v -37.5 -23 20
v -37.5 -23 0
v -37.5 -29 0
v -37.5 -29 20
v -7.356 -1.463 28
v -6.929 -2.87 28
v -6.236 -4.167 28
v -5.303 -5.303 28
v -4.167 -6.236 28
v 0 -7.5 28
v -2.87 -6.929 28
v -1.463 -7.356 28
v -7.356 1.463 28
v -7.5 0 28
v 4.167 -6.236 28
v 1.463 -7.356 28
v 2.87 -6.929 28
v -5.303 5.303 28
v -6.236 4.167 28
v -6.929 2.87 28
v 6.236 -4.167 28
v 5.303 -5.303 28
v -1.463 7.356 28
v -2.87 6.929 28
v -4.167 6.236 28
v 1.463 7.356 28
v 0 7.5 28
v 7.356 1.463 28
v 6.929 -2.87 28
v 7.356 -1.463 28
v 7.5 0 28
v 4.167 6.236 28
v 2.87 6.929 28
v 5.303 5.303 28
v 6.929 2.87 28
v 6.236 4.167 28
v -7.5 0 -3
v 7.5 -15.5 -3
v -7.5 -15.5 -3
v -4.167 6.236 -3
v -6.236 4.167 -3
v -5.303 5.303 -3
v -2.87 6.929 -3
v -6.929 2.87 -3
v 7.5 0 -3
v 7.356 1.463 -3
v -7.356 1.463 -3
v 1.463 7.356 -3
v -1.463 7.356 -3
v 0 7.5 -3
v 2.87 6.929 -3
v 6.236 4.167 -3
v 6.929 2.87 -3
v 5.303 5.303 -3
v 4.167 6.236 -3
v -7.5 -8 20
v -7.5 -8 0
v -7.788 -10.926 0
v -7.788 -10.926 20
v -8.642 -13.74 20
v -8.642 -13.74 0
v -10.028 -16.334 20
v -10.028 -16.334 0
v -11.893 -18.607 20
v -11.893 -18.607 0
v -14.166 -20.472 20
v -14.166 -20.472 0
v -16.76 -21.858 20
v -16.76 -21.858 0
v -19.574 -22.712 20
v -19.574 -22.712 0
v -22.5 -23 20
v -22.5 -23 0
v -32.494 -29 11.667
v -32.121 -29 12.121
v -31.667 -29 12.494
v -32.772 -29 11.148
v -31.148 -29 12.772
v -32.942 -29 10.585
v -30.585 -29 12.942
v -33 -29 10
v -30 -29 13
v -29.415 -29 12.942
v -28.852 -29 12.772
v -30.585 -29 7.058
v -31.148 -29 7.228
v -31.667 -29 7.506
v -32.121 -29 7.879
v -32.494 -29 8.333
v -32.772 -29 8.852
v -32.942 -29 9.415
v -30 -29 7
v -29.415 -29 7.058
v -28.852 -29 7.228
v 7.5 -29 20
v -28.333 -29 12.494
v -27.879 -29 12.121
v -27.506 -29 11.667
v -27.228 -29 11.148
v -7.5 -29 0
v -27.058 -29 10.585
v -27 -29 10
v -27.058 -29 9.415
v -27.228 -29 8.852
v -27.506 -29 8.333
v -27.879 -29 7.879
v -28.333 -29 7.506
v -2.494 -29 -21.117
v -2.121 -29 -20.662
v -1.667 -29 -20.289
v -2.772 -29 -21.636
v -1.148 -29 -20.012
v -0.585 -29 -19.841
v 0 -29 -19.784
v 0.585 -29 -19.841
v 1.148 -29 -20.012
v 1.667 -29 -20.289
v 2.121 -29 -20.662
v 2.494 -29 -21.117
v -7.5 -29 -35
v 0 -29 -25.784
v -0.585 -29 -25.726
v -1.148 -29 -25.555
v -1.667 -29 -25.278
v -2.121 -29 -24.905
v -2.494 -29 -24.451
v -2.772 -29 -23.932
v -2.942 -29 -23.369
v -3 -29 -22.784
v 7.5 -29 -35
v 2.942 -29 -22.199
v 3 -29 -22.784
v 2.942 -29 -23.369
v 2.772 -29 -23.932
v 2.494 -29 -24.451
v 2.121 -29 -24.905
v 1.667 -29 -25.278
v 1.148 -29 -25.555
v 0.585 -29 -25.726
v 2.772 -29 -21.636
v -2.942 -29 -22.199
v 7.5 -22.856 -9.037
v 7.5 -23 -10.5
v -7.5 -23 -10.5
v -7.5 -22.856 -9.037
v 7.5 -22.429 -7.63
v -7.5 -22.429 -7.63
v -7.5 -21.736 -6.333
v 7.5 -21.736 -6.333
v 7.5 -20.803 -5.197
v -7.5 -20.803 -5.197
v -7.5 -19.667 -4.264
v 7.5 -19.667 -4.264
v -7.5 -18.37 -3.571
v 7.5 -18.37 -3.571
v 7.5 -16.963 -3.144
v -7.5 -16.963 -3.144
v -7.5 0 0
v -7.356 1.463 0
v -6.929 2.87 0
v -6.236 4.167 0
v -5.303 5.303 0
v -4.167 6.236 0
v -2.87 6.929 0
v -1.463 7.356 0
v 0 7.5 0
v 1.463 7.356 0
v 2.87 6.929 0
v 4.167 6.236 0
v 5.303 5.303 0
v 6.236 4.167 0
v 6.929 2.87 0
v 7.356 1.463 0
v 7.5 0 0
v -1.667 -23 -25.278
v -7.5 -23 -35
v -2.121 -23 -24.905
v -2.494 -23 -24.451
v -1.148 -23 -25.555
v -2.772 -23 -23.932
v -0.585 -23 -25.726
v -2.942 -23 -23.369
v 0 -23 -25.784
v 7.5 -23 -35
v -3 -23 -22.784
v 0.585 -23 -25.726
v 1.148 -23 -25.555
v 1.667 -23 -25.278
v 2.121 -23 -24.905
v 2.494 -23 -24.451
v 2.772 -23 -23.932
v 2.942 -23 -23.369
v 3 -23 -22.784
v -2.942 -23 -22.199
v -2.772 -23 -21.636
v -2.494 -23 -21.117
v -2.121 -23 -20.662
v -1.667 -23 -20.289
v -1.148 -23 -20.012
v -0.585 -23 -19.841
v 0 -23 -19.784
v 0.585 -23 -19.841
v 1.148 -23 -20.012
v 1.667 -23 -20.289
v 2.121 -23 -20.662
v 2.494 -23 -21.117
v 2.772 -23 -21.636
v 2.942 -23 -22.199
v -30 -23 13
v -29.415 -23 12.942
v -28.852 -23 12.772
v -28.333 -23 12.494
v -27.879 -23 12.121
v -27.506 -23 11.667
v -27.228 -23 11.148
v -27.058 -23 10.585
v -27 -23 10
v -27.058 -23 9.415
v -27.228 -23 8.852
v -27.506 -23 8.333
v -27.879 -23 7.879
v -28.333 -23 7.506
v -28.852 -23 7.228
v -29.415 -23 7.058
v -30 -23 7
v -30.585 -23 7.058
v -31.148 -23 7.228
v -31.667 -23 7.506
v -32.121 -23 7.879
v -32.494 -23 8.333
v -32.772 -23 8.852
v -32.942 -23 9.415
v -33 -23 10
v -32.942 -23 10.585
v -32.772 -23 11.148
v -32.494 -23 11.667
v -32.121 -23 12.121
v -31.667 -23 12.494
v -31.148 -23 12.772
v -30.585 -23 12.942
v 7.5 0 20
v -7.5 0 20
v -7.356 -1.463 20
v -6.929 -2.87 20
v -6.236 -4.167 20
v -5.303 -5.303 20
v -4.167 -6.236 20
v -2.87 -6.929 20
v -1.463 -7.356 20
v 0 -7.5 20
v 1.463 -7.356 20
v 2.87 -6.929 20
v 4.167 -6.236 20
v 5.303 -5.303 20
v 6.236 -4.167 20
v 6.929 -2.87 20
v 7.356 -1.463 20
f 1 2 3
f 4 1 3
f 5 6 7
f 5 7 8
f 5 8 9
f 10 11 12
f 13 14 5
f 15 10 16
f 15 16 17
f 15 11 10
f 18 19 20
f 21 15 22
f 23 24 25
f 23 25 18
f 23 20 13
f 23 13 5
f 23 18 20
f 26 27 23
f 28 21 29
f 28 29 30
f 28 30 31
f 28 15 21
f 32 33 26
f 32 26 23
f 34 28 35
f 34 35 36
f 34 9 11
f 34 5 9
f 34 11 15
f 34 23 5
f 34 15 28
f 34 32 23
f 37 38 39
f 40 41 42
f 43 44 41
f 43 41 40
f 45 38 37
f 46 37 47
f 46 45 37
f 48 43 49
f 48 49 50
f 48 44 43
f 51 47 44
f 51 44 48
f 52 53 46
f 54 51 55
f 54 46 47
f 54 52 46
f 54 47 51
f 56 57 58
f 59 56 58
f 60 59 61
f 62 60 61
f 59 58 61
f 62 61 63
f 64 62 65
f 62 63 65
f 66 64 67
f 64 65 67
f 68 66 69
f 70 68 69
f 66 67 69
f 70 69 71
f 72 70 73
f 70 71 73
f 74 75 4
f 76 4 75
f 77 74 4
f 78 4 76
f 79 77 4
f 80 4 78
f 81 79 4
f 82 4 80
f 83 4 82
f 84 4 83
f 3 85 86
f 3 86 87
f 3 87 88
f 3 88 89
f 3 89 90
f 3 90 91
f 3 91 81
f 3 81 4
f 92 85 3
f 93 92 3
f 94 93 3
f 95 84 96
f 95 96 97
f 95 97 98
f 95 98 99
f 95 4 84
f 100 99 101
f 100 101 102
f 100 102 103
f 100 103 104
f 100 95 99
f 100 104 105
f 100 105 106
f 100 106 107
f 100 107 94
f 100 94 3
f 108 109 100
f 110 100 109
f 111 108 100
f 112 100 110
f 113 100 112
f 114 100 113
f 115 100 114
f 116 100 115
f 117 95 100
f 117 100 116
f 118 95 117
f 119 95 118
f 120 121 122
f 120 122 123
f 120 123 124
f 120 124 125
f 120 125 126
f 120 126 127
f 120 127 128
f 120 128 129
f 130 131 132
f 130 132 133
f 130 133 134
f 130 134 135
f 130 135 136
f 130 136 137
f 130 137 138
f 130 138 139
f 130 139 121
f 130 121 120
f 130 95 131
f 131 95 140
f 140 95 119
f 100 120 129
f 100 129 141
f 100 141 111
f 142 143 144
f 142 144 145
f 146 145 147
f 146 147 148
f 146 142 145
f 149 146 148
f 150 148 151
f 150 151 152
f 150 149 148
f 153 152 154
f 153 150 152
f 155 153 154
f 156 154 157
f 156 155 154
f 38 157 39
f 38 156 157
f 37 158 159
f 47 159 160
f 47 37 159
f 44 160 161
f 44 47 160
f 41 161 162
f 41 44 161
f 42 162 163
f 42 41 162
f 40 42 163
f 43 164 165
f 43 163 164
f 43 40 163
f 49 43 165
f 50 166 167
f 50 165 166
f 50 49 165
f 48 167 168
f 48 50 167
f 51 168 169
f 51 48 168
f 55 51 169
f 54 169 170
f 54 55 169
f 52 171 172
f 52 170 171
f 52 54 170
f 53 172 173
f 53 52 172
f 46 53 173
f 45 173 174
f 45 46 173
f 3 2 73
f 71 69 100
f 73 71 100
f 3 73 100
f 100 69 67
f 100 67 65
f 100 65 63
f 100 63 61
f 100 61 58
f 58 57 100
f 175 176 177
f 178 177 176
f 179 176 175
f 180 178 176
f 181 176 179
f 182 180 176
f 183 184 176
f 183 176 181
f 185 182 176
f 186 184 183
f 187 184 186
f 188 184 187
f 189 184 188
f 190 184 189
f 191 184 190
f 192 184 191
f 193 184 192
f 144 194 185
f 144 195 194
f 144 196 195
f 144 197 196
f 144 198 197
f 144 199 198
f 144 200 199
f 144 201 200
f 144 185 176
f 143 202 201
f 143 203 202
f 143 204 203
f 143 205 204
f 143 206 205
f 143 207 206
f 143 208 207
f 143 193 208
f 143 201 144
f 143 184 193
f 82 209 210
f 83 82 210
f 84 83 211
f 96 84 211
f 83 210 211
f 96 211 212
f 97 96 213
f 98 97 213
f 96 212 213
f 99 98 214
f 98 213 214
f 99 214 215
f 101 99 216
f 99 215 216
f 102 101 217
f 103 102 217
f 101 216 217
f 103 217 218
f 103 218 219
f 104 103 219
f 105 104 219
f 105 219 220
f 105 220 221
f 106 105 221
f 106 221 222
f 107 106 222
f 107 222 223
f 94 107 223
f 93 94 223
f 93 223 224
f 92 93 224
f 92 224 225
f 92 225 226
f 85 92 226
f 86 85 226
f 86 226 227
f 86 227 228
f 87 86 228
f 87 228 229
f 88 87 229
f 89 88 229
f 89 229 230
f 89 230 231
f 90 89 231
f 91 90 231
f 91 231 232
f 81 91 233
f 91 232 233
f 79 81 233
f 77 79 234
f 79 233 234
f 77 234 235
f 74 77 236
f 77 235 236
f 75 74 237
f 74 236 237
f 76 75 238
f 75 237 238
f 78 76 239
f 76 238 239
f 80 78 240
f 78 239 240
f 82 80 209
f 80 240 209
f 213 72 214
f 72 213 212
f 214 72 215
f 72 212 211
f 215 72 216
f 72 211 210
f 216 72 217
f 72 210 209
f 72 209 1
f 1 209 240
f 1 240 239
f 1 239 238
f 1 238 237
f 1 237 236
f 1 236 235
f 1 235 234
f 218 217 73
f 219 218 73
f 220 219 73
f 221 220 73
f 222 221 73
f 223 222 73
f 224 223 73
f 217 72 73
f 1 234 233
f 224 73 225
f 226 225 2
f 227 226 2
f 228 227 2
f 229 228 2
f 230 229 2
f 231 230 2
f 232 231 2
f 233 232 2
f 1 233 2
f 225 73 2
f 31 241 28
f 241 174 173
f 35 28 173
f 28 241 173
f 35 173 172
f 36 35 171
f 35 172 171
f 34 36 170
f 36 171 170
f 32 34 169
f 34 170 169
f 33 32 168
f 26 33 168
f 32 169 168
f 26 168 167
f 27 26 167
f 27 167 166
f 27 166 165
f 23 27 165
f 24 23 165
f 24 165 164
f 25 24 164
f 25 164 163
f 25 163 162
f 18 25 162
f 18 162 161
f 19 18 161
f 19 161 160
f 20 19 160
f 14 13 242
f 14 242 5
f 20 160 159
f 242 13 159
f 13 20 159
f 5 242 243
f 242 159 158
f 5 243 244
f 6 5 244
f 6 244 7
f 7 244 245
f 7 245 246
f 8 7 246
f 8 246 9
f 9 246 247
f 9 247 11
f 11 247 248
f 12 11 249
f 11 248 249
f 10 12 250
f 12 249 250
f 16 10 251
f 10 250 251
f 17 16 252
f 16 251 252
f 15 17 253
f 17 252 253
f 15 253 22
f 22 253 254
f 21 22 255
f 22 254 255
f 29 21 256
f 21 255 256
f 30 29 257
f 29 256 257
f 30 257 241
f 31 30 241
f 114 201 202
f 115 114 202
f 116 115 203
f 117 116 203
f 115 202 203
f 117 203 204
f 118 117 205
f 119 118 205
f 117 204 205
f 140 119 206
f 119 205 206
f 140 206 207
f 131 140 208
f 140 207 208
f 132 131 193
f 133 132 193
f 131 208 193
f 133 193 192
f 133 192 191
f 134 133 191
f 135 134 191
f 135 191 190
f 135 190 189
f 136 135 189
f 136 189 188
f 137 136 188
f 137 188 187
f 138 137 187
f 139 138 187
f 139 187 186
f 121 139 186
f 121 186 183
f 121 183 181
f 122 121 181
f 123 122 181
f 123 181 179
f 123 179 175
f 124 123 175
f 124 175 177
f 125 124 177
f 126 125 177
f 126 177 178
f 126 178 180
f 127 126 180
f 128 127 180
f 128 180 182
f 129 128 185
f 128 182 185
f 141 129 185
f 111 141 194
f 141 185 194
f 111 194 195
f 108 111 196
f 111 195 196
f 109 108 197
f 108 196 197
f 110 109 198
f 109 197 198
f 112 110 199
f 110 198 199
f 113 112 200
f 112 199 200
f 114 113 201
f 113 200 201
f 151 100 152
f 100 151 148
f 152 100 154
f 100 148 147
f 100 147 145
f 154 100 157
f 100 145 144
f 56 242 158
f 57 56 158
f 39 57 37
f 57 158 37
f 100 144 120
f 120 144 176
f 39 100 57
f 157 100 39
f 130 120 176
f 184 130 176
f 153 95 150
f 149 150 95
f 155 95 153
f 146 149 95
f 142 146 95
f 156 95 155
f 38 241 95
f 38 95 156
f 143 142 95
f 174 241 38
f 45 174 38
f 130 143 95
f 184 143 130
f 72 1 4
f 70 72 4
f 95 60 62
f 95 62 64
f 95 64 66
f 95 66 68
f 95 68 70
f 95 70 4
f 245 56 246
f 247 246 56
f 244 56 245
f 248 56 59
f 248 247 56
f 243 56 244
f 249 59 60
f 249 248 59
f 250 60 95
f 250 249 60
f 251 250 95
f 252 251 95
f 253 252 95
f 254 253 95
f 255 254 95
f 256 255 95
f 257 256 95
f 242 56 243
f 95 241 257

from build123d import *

# Parameters (mm, degrees)
BOSS_EXTRUDE1_DEPTH = 20
SKETCH3_R           = 7.5
BOSS_EXTRUDE3_DEPTH = 8
BOSS_EXTRUDE4_DEPTH = 15
BOSS_EXTRUDE5_START = 3
SKETCH5_R           = 7.5
BOSS_EXTRUDE5_DEPTH = 3
SKETCH6_R           = 3
CUT_EXTRUDE1_DEPTH  = 60.678304265


with BuildPart() as part:
    # Sketch1 → Boss-Extrude1 (new body)
    with BuildSketch(Plane.XY):
        with BuildLine():
            Line((-7.5, 0), (-7.5, -8))
            ThreePointArc((-7.5, -8), (-11.893398282, -18.606601718), (-22.5, -23))
            Line((-22.5, -23), (-37.5, -23))
            Line((-37.5, -23), (-37.5, -29))
            Line((-37.5, -29), (7.5, -29))
            Line((7.5, -29), (7.5, -23))
            Line((7.5, -23), (7.5, -8))
            Line((7.5, -8), (7.5, 0))
            ThreePointArc((7.5, 0), (0, 7.5), (-7.5, 0))
        make_face()
    extrude(amount=BOSS_EXTRUDE1_DEPTH)

    # Sketch3 → Boss-Extrude3 (add)
    with BuildSketch(Plane.XY.offset(20)):
        Circle(SKETCH3_R)
    extrude(amount=BOSS_EXTRUDE3_DEPTH)

    # Sketch4 → Boss-Extrude4 (add)
    with BuildSketch(Plane(origin=(7.5, 0, 0), x_dir=(0, 0, -1), z_dir=(1, 0, 0))):
        with BuildLine():
            Line((0, -29), (35, -29))
            Line((35, -29), (35, -23))
            Line((35, -23), (10.5, -23))
            ThreePointArc((10.5, -23), (5.196699141, -20.803300859), (3, -15.5))
            Line((3, -15.5), (3, 0))
            Line((3, 0), (0, 0))
            Line((0, 0), (0, -29))
        make_face()
    extrude(amount=-BOSS_EXTRUDE4_DEPTH)

    # Sketch5 → Boss-Extrude5 (add)
    with BuildSketch(Plane(origin=(0, 0, 0), x_dir=(-1, 0, 0), z_dir=(0, 0, -1)).offset(BOSS_EXTRUDE5_START)):
        with Locations(Location((0, 0, 0), (0, 0, 180))):
            Circle(SKETCH5_R)
    extrude(amount=-BOSS_EXTRUDE5_DEPTH)

    # Sketch6 → Cut-Extrude1 (cut, through all)
    with BuildSketch(Plane(origin=(0, -23, 0), x_dir=(1, 0, 0), z_dir=(0, 1, 0))):
        with Locations(Location((0, 22.783810394, 0), (0, 0, 270))):
            Circle(SKETCH6_R)
        with Locations(Location((-30, -10, 0), (0, 0, 270))):
            Circle(SKETCH6_R)
    extrude(amount=-CUT_EXTRUDE1_DEPTH, mode=Mode.SUBTRACT)


solid = part.part
